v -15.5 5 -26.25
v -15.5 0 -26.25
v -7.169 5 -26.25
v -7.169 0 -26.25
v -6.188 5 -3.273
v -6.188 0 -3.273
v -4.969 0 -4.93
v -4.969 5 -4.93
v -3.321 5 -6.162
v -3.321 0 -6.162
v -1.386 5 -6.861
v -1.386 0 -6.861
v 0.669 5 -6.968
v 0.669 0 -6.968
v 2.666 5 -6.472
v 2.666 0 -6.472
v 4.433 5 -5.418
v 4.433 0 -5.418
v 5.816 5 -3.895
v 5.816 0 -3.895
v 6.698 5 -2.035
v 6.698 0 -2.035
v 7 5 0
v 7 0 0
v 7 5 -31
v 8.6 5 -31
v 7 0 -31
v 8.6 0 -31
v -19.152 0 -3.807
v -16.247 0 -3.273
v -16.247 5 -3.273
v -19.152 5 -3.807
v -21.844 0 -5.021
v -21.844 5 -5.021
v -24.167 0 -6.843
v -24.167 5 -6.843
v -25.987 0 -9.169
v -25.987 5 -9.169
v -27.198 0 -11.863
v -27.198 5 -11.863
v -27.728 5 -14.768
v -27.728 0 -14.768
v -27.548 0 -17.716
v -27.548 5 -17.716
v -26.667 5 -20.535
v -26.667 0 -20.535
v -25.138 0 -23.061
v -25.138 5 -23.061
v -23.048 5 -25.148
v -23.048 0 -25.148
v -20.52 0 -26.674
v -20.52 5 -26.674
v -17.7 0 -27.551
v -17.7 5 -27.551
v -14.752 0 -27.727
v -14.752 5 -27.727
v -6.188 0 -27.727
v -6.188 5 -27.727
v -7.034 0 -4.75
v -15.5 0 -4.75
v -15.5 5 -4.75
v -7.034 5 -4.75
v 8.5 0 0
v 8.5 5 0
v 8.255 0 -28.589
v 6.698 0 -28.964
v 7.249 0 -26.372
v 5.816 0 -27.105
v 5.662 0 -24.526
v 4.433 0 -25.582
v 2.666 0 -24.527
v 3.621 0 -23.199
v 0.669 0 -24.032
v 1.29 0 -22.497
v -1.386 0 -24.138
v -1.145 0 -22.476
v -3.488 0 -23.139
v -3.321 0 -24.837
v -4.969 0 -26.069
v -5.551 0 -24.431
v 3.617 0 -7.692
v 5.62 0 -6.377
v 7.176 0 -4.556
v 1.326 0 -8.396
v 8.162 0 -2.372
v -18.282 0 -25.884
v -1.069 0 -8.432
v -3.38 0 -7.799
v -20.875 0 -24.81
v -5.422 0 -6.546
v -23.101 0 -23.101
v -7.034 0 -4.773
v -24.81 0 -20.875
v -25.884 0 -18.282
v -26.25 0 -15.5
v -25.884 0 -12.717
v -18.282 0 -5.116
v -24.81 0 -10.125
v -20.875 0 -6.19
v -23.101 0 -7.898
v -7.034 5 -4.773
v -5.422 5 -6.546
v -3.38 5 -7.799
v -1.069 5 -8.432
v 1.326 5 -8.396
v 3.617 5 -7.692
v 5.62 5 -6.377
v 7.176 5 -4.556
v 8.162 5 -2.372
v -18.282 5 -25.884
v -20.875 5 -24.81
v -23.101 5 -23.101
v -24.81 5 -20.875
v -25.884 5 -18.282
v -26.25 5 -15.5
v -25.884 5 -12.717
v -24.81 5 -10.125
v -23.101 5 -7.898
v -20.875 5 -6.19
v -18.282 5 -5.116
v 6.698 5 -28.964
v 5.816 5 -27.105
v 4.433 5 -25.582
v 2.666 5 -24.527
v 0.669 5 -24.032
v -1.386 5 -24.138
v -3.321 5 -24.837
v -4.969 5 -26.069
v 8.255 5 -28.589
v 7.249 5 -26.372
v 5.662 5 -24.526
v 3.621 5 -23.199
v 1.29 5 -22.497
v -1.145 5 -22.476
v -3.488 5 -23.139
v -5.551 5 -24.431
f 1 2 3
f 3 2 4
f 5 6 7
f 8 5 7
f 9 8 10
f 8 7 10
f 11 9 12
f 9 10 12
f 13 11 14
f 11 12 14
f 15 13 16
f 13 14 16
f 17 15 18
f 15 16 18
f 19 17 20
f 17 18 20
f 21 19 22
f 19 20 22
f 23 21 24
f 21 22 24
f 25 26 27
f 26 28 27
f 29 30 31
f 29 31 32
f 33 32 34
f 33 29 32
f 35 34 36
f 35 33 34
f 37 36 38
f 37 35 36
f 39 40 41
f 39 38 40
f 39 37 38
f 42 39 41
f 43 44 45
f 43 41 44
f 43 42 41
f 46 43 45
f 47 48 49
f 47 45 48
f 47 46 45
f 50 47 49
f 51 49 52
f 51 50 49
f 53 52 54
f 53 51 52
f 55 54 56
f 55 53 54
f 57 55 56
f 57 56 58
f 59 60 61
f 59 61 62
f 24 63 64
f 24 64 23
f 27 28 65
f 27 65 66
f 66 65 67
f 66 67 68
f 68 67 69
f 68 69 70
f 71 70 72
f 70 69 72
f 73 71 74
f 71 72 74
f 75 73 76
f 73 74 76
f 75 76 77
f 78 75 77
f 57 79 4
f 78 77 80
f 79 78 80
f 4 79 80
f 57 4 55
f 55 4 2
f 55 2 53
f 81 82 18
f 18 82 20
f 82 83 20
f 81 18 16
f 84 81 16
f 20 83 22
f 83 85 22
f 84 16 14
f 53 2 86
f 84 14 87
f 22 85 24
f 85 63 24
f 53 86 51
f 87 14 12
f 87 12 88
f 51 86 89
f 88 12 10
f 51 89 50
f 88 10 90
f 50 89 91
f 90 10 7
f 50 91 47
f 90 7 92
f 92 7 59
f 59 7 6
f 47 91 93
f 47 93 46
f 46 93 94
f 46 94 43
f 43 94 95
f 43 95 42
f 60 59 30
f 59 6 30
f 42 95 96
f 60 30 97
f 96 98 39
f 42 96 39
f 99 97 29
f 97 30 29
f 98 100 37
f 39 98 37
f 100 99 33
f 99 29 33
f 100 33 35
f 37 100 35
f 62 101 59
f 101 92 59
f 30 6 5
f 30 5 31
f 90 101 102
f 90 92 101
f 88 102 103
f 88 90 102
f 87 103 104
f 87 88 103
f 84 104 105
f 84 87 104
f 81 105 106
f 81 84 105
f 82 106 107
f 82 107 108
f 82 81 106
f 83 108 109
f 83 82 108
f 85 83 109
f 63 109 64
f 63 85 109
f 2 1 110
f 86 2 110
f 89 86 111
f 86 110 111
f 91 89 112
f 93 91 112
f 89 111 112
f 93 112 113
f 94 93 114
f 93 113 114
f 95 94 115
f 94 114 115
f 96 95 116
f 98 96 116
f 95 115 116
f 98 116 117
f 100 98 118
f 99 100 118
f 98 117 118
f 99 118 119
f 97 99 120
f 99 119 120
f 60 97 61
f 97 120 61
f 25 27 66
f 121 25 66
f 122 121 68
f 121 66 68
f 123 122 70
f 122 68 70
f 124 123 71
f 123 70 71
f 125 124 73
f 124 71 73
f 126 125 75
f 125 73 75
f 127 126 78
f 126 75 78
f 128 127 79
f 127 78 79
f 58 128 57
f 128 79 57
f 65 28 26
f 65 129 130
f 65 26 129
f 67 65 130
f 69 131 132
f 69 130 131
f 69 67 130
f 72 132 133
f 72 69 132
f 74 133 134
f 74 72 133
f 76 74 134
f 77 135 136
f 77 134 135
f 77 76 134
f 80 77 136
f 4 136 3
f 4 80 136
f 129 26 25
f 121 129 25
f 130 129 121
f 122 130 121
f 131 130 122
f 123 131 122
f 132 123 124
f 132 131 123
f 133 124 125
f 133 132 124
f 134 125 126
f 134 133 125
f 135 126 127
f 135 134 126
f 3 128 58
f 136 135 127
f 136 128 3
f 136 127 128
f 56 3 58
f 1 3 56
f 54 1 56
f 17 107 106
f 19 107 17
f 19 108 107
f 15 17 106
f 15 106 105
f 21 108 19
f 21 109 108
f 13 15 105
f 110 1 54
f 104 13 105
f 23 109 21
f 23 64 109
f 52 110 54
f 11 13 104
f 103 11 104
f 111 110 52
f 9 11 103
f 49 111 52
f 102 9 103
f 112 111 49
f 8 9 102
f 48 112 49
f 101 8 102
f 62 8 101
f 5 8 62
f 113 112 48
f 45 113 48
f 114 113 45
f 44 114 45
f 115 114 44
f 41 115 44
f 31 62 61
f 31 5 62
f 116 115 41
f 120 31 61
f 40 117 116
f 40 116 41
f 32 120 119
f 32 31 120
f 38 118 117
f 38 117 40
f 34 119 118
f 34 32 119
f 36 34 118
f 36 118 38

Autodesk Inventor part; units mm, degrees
ref_plane "YZ Plane" through (0, 0, 0) normal (1, 0, 0) x (0, 1, 0)
ref_plane "XZ Plane" through (0, 0, 0) normal (0, 1, 0) x (-1, 0, 0)
ref_plane "XY Plane" through (0, 0, 0) normal (0, 0, 1) x (1, 0, 0)
sketch "Sketch1" plane through (0, 0, 0) normal (0, 1, 0) x (-1, 0, 0)
  arc A0 (-7, 0) -> (7, 0) centre (0, 0) ccw
  line L0 (0, 0) -> (15.4998, -15.4998)
  line L1 (0, 0) -> (21.92, 0) construction
  arc A1 (14.3592, -26.1891) -> (7.8984, -7.8984) centre (15.4998, -15.4998) ccw
  line L2 (0, 0) -> (-7, 0)
  line L3 (15.4998, -15.4998) -> (15.4998, -4.7498)
  line L4 (15.4998, -15.4998) -> (26.2498, -15.4998) construction
  line L5 (15.4998, -4.7498) -> (5.1419, -4.7498)
  line L6 (15.4998, -15.4998) -> (15.4998, -26.2498)
  line L7 (15.4998, -15.4998) -> (37.4198, -15.4998) construction
  line L8 (15.4998, -26.2498) -> (26.0213, -26.2498) construction
  arc A2 (14.7522, -27.727) -> (16.2473, -3.2726) centre (15.4998, -15.4998) ccw
  line L9 (15.4998, -15.4998) -> (14.7522, -27.727) construction
  line L10 (15.4998, -15.4998) -> (16.2473, -3.2726) construction
  line L11 (-8.5, 0) -> (-7, 0)
  arc A3 (-8.5, 0) -> (7.0336, -4.7726) centre (0, 0) ccw
  line L12 (0, 0) -> (-8.5, 0) construction
  line L13 (0, 0) -> (8.5, 0) construction
  line L14 (7.0336, -4.7726) -> (7.0336, -3.2726)
  line L15 (7.0336, -3.2726) -> (6.1879, -3.2726)
  line L16 (7.0336, -3.2726) -> (16.2473, -3.2726)
  line L17 (14.7522, -27.727) -> (22.4821, -27.727) construction
  line L18 (15.4998, -15.4998) -> (0, -15.4998)
  line L19 (15.4998, -15.4998) -> (0, -30.9996)
  line L20 (15.4998, -15.4998) -> (37.4198, -15.4998) construction
  line L21 (14.3592, -26.1891) -> (22.4791, -26.1891) construction
  arc A4 (7, -30.9996) -> (-7, -30.9996) centre (0, -30.9996) ccw
  arc A5 (8.6, -30.9996) -> (-8.6, -30.9996) centre (0, -30.9996) ccw
  line L22 (15.4998, -26.2498) -> (7.1694, -26.2498)
  line L23 (14.7522, -27.727) -> (7.953, -27.727)
  line L24 (-8.6, -30.9996) -> (-7, -30.9996)
  line L25 (7.953, -27.727) -> (6.1879, -27.727)
  dimension "d0" = 14
  dimension "d1" = 21.92
  dimension "d2" = 45
  dimension "d3" = 21.5
  dimension "d4" = 10.75
  dimension "d5" = 90
  dimension "d6" = 90
  dimension "d13" = 12.25
  dimension "d14" = 180
  dimension "d21" = 8.5
  dimension "d22" = 180
  dimension "d23" = 1.5
  dimension "d24" = 90
  dimension "d25" = 7.0336
  dimension "d31" = 21.92
  dimension "d32" = 135
  dimension "d44" = 7
  dimension "d45" = 8.6
extrude "Extrusion3" add sketch "Sketch1" along normal blind 5 contours L5 L14 A3 L0 A0 | A0 L15 L14 L5 | L0 A3 L11 A0 | L14 L16 A2 L23 A5 L22 A1 L5 | A1 L6 L3 | A5 L25 A4 L19 | L19 A4 L24 A5
sketch "Sketch3" plane through (0, 5, 0) normal (0, 1, 0) x (1, 0, 0)
  line L0 (-15.4998, 26.2498) -> (-15.4998, 4.7498) projected
  arc A0 (-15.4998, 26.2498) -> (-15.4998, 4.7498) centre (-15.4998, 15.4998) ccw
  line L1 (-15.4998, 4.7498) -> (-15.4998, 15.4998)
  line L2 (-15.4998, 15.4998) -> (-15.4998, 26.2498)
  point P0 (0, 0)
extrude "Extrusion4" cut sketch "Sketch3" against normal blind 5
properties part number "small_belt_loop"
